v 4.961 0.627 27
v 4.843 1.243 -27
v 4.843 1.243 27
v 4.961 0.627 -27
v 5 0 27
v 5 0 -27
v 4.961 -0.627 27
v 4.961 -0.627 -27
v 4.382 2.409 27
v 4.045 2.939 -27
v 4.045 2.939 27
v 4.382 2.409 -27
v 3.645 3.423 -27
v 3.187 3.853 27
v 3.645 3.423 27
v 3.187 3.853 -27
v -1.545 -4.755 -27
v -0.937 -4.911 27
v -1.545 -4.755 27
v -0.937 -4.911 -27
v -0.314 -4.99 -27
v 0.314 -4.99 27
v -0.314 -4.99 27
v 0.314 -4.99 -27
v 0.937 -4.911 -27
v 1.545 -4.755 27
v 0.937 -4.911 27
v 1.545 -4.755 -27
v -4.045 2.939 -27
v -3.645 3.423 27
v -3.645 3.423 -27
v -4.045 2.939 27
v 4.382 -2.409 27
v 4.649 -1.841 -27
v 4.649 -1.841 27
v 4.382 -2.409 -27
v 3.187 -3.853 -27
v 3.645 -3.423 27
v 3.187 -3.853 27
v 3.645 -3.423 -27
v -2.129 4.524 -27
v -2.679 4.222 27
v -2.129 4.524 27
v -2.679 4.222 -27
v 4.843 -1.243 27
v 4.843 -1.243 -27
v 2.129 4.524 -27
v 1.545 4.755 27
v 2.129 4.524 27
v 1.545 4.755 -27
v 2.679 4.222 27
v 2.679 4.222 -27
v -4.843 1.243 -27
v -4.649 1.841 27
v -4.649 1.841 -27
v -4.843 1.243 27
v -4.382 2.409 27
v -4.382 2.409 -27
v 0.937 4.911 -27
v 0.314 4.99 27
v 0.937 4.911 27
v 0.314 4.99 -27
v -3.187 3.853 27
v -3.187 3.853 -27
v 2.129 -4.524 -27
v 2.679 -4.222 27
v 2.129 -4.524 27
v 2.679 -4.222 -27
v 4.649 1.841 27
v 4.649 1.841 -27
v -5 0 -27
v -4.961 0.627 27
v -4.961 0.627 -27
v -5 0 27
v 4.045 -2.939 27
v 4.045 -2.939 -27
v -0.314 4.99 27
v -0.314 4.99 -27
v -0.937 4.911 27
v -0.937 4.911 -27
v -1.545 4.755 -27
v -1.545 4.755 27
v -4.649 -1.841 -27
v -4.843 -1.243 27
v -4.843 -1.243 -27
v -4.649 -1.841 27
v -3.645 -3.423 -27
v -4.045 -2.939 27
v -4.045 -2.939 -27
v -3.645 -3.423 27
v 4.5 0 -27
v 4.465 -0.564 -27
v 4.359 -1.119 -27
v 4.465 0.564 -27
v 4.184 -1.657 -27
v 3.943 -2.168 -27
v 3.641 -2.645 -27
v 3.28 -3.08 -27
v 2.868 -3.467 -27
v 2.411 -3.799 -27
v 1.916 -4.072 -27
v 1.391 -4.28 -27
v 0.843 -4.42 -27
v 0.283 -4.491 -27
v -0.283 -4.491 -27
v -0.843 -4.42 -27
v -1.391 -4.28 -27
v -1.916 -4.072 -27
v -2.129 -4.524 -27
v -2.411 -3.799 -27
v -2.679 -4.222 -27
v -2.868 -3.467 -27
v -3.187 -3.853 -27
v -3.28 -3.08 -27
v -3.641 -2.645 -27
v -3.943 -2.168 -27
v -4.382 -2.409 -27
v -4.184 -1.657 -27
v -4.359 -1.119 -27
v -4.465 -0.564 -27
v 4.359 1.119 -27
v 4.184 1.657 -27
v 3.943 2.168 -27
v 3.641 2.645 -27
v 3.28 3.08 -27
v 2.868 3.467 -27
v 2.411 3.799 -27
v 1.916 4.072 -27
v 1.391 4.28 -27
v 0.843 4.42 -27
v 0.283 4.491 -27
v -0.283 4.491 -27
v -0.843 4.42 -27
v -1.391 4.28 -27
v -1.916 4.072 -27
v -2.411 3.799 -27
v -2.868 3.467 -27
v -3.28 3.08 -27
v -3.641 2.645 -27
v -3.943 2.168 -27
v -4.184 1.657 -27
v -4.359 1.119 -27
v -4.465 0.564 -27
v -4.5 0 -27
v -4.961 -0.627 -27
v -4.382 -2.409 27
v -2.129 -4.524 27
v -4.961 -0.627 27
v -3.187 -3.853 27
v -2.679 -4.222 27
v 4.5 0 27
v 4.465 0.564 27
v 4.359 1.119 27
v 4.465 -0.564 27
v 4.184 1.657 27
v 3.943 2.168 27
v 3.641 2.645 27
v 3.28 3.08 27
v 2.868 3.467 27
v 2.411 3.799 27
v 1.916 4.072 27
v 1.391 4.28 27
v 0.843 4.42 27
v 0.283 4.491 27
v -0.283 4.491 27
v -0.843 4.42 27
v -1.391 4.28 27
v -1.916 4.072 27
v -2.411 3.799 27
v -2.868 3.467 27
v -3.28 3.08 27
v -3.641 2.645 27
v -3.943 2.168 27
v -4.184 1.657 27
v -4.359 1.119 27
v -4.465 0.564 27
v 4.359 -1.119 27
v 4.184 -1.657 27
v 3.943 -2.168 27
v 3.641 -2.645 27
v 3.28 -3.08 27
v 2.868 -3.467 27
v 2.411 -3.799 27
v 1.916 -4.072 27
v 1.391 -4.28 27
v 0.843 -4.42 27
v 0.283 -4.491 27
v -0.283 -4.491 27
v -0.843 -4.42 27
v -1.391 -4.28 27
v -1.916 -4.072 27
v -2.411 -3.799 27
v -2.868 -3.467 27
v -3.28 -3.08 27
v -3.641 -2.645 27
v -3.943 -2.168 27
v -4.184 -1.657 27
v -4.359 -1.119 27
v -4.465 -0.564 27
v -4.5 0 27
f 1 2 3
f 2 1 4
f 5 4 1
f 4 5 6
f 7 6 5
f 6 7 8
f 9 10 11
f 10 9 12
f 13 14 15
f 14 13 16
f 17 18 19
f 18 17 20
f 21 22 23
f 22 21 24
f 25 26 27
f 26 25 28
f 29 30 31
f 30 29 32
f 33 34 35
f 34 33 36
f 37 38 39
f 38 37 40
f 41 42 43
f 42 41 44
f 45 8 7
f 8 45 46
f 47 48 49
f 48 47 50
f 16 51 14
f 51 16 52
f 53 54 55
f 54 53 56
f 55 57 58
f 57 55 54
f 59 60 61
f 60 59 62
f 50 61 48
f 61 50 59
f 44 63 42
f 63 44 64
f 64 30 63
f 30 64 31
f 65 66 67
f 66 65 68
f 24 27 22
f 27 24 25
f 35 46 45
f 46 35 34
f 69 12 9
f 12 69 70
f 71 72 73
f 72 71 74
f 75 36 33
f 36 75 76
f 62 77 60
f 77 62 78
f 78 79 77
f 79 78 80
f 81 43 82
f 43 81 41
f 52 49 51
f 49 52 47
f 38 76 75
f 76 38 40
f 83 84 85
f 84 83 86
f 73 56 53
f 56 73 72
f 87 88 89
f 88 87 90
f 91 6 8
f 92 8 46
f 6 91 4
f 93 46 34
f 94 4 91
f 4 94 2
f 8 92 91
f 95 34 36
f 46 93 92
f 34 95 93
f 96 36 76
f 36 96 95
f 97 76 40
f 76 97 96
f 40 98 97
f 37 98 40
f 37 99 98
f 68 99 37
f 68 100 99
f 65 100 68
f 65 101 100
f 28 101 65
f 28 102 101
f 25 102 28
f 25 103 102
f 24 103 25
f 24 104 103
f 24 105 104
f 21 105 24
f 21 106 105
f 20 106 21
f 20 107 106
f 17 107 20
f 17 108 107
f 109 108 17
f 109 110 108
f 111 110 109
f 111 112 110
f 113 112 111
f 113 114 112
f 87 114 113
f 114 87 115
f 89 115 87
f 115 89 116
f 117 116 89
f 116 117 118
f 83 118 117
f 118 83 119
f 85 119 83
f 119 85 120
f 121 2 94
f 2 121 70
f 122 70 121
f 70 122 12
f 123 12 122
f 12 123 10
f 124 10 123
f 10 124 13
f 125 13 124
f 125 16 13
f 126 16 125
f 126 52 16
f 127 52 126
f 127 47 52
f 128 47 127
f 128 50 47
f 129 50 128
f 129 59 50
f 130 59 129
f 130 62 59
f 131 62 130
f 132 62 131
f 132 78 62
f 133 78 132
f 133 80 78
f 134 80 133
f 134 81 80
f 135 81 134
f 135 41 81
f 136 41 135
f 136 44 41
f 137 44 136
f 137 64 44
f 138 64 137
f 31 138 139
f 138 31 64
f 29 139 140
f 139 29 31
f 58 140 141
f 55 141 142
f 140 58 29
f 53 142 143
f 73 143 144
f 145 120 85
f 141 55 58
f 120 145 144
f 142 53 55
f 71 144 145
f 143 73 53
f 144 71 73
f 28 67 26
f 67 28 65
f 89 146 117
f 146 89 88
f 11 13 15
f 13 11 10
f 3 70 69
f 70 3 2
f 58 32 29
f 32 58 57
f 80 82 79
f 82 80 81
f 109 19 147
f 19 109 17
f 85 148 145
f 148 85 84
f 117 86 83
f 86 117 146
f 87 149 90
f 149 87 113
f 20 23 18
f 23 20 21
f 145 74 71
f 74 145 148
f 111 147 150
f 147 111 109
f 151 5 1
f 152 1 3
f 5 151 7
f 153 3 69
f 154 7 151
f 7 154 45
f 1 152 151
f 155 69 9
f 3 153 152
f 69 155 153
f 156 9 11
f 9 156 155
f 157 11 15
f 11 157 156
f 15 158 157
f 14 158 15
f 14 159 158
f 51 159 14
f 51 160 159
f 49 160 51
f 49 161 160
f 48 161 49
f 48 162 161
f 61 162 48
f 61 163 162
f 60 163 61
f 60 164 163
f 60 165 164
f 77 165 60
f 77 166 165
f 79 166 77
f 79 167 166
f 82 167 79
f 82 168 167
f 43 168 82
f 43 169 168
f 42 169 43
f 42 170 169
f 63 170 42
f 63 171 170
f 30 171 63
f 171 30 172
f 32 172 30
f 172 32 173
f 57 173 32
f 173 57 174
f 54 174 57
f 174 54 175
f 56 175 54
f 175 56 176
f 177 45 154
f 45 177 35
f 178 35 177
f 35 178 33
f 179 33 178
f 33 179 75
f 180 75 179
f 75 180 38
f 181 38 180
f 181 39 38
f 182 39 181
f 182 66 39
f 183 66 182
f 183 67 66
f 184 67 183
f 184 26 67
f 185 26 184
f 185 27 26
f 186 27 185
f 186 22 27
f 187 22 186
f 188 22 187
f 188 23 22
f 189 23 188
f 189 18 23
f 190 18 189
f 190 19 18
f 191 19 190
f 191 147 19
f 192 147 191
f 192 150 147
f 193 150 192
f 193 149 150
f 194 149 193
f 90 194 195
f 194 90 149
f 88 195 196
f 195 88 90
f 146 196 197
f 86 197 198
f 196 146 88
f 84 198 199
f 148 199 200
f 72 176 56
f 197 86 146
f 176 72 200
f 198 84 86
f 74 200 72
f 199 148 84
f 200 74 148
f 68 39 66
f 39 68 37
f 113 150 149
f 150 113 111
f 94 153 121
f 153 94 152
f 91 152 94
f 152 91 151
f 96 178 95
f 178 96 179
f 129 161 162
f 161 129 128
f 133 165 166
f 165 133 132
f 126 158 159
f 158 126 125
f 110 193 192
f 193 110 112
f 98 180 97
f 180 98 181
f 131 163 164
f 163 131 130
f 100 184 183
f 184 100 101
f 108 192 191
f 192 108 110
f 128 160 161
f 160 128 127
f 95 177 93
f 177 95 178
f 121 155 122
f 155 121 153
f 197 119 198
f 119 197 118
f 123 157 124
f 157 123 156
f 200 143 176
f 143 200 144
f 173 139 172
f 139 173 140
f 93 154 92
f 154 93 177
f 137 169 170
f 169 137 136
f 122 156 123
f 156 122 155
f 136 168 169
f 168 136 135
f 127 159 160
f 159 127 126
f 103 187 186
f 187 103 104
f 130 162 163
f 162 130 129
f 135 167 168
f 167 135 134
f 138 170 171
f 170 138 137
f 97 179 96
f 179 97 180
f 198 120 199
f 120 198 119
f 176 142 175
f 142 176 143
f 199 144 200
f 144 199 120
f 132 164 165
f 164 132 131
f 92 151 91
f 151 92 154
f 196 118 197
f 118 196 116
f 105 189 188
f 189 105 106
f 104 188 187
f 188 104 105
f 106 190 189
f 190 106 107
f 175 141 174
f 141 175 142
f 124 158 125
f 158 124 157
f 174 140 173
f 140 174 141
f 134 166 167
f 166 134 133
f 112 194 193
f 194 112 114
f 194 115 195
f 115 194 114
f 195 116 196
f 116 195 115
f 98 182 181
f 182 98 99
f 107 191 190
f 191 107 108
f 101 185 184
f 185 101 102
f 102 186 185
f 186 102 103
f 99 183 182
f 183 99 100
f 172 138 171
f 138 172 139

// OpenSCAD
$fn = 50;


difference() {
	union() {
		translate(v = [0, 0, -27.0000000000]) {
			cylinder(h = 54, r = 5.0000000000);
		}
	}
	union() {
		translate(v = [0, 0, -100.0000000000]) {
			cylinder(h = 200, r = 4.5000000000);
		}
	}
}
